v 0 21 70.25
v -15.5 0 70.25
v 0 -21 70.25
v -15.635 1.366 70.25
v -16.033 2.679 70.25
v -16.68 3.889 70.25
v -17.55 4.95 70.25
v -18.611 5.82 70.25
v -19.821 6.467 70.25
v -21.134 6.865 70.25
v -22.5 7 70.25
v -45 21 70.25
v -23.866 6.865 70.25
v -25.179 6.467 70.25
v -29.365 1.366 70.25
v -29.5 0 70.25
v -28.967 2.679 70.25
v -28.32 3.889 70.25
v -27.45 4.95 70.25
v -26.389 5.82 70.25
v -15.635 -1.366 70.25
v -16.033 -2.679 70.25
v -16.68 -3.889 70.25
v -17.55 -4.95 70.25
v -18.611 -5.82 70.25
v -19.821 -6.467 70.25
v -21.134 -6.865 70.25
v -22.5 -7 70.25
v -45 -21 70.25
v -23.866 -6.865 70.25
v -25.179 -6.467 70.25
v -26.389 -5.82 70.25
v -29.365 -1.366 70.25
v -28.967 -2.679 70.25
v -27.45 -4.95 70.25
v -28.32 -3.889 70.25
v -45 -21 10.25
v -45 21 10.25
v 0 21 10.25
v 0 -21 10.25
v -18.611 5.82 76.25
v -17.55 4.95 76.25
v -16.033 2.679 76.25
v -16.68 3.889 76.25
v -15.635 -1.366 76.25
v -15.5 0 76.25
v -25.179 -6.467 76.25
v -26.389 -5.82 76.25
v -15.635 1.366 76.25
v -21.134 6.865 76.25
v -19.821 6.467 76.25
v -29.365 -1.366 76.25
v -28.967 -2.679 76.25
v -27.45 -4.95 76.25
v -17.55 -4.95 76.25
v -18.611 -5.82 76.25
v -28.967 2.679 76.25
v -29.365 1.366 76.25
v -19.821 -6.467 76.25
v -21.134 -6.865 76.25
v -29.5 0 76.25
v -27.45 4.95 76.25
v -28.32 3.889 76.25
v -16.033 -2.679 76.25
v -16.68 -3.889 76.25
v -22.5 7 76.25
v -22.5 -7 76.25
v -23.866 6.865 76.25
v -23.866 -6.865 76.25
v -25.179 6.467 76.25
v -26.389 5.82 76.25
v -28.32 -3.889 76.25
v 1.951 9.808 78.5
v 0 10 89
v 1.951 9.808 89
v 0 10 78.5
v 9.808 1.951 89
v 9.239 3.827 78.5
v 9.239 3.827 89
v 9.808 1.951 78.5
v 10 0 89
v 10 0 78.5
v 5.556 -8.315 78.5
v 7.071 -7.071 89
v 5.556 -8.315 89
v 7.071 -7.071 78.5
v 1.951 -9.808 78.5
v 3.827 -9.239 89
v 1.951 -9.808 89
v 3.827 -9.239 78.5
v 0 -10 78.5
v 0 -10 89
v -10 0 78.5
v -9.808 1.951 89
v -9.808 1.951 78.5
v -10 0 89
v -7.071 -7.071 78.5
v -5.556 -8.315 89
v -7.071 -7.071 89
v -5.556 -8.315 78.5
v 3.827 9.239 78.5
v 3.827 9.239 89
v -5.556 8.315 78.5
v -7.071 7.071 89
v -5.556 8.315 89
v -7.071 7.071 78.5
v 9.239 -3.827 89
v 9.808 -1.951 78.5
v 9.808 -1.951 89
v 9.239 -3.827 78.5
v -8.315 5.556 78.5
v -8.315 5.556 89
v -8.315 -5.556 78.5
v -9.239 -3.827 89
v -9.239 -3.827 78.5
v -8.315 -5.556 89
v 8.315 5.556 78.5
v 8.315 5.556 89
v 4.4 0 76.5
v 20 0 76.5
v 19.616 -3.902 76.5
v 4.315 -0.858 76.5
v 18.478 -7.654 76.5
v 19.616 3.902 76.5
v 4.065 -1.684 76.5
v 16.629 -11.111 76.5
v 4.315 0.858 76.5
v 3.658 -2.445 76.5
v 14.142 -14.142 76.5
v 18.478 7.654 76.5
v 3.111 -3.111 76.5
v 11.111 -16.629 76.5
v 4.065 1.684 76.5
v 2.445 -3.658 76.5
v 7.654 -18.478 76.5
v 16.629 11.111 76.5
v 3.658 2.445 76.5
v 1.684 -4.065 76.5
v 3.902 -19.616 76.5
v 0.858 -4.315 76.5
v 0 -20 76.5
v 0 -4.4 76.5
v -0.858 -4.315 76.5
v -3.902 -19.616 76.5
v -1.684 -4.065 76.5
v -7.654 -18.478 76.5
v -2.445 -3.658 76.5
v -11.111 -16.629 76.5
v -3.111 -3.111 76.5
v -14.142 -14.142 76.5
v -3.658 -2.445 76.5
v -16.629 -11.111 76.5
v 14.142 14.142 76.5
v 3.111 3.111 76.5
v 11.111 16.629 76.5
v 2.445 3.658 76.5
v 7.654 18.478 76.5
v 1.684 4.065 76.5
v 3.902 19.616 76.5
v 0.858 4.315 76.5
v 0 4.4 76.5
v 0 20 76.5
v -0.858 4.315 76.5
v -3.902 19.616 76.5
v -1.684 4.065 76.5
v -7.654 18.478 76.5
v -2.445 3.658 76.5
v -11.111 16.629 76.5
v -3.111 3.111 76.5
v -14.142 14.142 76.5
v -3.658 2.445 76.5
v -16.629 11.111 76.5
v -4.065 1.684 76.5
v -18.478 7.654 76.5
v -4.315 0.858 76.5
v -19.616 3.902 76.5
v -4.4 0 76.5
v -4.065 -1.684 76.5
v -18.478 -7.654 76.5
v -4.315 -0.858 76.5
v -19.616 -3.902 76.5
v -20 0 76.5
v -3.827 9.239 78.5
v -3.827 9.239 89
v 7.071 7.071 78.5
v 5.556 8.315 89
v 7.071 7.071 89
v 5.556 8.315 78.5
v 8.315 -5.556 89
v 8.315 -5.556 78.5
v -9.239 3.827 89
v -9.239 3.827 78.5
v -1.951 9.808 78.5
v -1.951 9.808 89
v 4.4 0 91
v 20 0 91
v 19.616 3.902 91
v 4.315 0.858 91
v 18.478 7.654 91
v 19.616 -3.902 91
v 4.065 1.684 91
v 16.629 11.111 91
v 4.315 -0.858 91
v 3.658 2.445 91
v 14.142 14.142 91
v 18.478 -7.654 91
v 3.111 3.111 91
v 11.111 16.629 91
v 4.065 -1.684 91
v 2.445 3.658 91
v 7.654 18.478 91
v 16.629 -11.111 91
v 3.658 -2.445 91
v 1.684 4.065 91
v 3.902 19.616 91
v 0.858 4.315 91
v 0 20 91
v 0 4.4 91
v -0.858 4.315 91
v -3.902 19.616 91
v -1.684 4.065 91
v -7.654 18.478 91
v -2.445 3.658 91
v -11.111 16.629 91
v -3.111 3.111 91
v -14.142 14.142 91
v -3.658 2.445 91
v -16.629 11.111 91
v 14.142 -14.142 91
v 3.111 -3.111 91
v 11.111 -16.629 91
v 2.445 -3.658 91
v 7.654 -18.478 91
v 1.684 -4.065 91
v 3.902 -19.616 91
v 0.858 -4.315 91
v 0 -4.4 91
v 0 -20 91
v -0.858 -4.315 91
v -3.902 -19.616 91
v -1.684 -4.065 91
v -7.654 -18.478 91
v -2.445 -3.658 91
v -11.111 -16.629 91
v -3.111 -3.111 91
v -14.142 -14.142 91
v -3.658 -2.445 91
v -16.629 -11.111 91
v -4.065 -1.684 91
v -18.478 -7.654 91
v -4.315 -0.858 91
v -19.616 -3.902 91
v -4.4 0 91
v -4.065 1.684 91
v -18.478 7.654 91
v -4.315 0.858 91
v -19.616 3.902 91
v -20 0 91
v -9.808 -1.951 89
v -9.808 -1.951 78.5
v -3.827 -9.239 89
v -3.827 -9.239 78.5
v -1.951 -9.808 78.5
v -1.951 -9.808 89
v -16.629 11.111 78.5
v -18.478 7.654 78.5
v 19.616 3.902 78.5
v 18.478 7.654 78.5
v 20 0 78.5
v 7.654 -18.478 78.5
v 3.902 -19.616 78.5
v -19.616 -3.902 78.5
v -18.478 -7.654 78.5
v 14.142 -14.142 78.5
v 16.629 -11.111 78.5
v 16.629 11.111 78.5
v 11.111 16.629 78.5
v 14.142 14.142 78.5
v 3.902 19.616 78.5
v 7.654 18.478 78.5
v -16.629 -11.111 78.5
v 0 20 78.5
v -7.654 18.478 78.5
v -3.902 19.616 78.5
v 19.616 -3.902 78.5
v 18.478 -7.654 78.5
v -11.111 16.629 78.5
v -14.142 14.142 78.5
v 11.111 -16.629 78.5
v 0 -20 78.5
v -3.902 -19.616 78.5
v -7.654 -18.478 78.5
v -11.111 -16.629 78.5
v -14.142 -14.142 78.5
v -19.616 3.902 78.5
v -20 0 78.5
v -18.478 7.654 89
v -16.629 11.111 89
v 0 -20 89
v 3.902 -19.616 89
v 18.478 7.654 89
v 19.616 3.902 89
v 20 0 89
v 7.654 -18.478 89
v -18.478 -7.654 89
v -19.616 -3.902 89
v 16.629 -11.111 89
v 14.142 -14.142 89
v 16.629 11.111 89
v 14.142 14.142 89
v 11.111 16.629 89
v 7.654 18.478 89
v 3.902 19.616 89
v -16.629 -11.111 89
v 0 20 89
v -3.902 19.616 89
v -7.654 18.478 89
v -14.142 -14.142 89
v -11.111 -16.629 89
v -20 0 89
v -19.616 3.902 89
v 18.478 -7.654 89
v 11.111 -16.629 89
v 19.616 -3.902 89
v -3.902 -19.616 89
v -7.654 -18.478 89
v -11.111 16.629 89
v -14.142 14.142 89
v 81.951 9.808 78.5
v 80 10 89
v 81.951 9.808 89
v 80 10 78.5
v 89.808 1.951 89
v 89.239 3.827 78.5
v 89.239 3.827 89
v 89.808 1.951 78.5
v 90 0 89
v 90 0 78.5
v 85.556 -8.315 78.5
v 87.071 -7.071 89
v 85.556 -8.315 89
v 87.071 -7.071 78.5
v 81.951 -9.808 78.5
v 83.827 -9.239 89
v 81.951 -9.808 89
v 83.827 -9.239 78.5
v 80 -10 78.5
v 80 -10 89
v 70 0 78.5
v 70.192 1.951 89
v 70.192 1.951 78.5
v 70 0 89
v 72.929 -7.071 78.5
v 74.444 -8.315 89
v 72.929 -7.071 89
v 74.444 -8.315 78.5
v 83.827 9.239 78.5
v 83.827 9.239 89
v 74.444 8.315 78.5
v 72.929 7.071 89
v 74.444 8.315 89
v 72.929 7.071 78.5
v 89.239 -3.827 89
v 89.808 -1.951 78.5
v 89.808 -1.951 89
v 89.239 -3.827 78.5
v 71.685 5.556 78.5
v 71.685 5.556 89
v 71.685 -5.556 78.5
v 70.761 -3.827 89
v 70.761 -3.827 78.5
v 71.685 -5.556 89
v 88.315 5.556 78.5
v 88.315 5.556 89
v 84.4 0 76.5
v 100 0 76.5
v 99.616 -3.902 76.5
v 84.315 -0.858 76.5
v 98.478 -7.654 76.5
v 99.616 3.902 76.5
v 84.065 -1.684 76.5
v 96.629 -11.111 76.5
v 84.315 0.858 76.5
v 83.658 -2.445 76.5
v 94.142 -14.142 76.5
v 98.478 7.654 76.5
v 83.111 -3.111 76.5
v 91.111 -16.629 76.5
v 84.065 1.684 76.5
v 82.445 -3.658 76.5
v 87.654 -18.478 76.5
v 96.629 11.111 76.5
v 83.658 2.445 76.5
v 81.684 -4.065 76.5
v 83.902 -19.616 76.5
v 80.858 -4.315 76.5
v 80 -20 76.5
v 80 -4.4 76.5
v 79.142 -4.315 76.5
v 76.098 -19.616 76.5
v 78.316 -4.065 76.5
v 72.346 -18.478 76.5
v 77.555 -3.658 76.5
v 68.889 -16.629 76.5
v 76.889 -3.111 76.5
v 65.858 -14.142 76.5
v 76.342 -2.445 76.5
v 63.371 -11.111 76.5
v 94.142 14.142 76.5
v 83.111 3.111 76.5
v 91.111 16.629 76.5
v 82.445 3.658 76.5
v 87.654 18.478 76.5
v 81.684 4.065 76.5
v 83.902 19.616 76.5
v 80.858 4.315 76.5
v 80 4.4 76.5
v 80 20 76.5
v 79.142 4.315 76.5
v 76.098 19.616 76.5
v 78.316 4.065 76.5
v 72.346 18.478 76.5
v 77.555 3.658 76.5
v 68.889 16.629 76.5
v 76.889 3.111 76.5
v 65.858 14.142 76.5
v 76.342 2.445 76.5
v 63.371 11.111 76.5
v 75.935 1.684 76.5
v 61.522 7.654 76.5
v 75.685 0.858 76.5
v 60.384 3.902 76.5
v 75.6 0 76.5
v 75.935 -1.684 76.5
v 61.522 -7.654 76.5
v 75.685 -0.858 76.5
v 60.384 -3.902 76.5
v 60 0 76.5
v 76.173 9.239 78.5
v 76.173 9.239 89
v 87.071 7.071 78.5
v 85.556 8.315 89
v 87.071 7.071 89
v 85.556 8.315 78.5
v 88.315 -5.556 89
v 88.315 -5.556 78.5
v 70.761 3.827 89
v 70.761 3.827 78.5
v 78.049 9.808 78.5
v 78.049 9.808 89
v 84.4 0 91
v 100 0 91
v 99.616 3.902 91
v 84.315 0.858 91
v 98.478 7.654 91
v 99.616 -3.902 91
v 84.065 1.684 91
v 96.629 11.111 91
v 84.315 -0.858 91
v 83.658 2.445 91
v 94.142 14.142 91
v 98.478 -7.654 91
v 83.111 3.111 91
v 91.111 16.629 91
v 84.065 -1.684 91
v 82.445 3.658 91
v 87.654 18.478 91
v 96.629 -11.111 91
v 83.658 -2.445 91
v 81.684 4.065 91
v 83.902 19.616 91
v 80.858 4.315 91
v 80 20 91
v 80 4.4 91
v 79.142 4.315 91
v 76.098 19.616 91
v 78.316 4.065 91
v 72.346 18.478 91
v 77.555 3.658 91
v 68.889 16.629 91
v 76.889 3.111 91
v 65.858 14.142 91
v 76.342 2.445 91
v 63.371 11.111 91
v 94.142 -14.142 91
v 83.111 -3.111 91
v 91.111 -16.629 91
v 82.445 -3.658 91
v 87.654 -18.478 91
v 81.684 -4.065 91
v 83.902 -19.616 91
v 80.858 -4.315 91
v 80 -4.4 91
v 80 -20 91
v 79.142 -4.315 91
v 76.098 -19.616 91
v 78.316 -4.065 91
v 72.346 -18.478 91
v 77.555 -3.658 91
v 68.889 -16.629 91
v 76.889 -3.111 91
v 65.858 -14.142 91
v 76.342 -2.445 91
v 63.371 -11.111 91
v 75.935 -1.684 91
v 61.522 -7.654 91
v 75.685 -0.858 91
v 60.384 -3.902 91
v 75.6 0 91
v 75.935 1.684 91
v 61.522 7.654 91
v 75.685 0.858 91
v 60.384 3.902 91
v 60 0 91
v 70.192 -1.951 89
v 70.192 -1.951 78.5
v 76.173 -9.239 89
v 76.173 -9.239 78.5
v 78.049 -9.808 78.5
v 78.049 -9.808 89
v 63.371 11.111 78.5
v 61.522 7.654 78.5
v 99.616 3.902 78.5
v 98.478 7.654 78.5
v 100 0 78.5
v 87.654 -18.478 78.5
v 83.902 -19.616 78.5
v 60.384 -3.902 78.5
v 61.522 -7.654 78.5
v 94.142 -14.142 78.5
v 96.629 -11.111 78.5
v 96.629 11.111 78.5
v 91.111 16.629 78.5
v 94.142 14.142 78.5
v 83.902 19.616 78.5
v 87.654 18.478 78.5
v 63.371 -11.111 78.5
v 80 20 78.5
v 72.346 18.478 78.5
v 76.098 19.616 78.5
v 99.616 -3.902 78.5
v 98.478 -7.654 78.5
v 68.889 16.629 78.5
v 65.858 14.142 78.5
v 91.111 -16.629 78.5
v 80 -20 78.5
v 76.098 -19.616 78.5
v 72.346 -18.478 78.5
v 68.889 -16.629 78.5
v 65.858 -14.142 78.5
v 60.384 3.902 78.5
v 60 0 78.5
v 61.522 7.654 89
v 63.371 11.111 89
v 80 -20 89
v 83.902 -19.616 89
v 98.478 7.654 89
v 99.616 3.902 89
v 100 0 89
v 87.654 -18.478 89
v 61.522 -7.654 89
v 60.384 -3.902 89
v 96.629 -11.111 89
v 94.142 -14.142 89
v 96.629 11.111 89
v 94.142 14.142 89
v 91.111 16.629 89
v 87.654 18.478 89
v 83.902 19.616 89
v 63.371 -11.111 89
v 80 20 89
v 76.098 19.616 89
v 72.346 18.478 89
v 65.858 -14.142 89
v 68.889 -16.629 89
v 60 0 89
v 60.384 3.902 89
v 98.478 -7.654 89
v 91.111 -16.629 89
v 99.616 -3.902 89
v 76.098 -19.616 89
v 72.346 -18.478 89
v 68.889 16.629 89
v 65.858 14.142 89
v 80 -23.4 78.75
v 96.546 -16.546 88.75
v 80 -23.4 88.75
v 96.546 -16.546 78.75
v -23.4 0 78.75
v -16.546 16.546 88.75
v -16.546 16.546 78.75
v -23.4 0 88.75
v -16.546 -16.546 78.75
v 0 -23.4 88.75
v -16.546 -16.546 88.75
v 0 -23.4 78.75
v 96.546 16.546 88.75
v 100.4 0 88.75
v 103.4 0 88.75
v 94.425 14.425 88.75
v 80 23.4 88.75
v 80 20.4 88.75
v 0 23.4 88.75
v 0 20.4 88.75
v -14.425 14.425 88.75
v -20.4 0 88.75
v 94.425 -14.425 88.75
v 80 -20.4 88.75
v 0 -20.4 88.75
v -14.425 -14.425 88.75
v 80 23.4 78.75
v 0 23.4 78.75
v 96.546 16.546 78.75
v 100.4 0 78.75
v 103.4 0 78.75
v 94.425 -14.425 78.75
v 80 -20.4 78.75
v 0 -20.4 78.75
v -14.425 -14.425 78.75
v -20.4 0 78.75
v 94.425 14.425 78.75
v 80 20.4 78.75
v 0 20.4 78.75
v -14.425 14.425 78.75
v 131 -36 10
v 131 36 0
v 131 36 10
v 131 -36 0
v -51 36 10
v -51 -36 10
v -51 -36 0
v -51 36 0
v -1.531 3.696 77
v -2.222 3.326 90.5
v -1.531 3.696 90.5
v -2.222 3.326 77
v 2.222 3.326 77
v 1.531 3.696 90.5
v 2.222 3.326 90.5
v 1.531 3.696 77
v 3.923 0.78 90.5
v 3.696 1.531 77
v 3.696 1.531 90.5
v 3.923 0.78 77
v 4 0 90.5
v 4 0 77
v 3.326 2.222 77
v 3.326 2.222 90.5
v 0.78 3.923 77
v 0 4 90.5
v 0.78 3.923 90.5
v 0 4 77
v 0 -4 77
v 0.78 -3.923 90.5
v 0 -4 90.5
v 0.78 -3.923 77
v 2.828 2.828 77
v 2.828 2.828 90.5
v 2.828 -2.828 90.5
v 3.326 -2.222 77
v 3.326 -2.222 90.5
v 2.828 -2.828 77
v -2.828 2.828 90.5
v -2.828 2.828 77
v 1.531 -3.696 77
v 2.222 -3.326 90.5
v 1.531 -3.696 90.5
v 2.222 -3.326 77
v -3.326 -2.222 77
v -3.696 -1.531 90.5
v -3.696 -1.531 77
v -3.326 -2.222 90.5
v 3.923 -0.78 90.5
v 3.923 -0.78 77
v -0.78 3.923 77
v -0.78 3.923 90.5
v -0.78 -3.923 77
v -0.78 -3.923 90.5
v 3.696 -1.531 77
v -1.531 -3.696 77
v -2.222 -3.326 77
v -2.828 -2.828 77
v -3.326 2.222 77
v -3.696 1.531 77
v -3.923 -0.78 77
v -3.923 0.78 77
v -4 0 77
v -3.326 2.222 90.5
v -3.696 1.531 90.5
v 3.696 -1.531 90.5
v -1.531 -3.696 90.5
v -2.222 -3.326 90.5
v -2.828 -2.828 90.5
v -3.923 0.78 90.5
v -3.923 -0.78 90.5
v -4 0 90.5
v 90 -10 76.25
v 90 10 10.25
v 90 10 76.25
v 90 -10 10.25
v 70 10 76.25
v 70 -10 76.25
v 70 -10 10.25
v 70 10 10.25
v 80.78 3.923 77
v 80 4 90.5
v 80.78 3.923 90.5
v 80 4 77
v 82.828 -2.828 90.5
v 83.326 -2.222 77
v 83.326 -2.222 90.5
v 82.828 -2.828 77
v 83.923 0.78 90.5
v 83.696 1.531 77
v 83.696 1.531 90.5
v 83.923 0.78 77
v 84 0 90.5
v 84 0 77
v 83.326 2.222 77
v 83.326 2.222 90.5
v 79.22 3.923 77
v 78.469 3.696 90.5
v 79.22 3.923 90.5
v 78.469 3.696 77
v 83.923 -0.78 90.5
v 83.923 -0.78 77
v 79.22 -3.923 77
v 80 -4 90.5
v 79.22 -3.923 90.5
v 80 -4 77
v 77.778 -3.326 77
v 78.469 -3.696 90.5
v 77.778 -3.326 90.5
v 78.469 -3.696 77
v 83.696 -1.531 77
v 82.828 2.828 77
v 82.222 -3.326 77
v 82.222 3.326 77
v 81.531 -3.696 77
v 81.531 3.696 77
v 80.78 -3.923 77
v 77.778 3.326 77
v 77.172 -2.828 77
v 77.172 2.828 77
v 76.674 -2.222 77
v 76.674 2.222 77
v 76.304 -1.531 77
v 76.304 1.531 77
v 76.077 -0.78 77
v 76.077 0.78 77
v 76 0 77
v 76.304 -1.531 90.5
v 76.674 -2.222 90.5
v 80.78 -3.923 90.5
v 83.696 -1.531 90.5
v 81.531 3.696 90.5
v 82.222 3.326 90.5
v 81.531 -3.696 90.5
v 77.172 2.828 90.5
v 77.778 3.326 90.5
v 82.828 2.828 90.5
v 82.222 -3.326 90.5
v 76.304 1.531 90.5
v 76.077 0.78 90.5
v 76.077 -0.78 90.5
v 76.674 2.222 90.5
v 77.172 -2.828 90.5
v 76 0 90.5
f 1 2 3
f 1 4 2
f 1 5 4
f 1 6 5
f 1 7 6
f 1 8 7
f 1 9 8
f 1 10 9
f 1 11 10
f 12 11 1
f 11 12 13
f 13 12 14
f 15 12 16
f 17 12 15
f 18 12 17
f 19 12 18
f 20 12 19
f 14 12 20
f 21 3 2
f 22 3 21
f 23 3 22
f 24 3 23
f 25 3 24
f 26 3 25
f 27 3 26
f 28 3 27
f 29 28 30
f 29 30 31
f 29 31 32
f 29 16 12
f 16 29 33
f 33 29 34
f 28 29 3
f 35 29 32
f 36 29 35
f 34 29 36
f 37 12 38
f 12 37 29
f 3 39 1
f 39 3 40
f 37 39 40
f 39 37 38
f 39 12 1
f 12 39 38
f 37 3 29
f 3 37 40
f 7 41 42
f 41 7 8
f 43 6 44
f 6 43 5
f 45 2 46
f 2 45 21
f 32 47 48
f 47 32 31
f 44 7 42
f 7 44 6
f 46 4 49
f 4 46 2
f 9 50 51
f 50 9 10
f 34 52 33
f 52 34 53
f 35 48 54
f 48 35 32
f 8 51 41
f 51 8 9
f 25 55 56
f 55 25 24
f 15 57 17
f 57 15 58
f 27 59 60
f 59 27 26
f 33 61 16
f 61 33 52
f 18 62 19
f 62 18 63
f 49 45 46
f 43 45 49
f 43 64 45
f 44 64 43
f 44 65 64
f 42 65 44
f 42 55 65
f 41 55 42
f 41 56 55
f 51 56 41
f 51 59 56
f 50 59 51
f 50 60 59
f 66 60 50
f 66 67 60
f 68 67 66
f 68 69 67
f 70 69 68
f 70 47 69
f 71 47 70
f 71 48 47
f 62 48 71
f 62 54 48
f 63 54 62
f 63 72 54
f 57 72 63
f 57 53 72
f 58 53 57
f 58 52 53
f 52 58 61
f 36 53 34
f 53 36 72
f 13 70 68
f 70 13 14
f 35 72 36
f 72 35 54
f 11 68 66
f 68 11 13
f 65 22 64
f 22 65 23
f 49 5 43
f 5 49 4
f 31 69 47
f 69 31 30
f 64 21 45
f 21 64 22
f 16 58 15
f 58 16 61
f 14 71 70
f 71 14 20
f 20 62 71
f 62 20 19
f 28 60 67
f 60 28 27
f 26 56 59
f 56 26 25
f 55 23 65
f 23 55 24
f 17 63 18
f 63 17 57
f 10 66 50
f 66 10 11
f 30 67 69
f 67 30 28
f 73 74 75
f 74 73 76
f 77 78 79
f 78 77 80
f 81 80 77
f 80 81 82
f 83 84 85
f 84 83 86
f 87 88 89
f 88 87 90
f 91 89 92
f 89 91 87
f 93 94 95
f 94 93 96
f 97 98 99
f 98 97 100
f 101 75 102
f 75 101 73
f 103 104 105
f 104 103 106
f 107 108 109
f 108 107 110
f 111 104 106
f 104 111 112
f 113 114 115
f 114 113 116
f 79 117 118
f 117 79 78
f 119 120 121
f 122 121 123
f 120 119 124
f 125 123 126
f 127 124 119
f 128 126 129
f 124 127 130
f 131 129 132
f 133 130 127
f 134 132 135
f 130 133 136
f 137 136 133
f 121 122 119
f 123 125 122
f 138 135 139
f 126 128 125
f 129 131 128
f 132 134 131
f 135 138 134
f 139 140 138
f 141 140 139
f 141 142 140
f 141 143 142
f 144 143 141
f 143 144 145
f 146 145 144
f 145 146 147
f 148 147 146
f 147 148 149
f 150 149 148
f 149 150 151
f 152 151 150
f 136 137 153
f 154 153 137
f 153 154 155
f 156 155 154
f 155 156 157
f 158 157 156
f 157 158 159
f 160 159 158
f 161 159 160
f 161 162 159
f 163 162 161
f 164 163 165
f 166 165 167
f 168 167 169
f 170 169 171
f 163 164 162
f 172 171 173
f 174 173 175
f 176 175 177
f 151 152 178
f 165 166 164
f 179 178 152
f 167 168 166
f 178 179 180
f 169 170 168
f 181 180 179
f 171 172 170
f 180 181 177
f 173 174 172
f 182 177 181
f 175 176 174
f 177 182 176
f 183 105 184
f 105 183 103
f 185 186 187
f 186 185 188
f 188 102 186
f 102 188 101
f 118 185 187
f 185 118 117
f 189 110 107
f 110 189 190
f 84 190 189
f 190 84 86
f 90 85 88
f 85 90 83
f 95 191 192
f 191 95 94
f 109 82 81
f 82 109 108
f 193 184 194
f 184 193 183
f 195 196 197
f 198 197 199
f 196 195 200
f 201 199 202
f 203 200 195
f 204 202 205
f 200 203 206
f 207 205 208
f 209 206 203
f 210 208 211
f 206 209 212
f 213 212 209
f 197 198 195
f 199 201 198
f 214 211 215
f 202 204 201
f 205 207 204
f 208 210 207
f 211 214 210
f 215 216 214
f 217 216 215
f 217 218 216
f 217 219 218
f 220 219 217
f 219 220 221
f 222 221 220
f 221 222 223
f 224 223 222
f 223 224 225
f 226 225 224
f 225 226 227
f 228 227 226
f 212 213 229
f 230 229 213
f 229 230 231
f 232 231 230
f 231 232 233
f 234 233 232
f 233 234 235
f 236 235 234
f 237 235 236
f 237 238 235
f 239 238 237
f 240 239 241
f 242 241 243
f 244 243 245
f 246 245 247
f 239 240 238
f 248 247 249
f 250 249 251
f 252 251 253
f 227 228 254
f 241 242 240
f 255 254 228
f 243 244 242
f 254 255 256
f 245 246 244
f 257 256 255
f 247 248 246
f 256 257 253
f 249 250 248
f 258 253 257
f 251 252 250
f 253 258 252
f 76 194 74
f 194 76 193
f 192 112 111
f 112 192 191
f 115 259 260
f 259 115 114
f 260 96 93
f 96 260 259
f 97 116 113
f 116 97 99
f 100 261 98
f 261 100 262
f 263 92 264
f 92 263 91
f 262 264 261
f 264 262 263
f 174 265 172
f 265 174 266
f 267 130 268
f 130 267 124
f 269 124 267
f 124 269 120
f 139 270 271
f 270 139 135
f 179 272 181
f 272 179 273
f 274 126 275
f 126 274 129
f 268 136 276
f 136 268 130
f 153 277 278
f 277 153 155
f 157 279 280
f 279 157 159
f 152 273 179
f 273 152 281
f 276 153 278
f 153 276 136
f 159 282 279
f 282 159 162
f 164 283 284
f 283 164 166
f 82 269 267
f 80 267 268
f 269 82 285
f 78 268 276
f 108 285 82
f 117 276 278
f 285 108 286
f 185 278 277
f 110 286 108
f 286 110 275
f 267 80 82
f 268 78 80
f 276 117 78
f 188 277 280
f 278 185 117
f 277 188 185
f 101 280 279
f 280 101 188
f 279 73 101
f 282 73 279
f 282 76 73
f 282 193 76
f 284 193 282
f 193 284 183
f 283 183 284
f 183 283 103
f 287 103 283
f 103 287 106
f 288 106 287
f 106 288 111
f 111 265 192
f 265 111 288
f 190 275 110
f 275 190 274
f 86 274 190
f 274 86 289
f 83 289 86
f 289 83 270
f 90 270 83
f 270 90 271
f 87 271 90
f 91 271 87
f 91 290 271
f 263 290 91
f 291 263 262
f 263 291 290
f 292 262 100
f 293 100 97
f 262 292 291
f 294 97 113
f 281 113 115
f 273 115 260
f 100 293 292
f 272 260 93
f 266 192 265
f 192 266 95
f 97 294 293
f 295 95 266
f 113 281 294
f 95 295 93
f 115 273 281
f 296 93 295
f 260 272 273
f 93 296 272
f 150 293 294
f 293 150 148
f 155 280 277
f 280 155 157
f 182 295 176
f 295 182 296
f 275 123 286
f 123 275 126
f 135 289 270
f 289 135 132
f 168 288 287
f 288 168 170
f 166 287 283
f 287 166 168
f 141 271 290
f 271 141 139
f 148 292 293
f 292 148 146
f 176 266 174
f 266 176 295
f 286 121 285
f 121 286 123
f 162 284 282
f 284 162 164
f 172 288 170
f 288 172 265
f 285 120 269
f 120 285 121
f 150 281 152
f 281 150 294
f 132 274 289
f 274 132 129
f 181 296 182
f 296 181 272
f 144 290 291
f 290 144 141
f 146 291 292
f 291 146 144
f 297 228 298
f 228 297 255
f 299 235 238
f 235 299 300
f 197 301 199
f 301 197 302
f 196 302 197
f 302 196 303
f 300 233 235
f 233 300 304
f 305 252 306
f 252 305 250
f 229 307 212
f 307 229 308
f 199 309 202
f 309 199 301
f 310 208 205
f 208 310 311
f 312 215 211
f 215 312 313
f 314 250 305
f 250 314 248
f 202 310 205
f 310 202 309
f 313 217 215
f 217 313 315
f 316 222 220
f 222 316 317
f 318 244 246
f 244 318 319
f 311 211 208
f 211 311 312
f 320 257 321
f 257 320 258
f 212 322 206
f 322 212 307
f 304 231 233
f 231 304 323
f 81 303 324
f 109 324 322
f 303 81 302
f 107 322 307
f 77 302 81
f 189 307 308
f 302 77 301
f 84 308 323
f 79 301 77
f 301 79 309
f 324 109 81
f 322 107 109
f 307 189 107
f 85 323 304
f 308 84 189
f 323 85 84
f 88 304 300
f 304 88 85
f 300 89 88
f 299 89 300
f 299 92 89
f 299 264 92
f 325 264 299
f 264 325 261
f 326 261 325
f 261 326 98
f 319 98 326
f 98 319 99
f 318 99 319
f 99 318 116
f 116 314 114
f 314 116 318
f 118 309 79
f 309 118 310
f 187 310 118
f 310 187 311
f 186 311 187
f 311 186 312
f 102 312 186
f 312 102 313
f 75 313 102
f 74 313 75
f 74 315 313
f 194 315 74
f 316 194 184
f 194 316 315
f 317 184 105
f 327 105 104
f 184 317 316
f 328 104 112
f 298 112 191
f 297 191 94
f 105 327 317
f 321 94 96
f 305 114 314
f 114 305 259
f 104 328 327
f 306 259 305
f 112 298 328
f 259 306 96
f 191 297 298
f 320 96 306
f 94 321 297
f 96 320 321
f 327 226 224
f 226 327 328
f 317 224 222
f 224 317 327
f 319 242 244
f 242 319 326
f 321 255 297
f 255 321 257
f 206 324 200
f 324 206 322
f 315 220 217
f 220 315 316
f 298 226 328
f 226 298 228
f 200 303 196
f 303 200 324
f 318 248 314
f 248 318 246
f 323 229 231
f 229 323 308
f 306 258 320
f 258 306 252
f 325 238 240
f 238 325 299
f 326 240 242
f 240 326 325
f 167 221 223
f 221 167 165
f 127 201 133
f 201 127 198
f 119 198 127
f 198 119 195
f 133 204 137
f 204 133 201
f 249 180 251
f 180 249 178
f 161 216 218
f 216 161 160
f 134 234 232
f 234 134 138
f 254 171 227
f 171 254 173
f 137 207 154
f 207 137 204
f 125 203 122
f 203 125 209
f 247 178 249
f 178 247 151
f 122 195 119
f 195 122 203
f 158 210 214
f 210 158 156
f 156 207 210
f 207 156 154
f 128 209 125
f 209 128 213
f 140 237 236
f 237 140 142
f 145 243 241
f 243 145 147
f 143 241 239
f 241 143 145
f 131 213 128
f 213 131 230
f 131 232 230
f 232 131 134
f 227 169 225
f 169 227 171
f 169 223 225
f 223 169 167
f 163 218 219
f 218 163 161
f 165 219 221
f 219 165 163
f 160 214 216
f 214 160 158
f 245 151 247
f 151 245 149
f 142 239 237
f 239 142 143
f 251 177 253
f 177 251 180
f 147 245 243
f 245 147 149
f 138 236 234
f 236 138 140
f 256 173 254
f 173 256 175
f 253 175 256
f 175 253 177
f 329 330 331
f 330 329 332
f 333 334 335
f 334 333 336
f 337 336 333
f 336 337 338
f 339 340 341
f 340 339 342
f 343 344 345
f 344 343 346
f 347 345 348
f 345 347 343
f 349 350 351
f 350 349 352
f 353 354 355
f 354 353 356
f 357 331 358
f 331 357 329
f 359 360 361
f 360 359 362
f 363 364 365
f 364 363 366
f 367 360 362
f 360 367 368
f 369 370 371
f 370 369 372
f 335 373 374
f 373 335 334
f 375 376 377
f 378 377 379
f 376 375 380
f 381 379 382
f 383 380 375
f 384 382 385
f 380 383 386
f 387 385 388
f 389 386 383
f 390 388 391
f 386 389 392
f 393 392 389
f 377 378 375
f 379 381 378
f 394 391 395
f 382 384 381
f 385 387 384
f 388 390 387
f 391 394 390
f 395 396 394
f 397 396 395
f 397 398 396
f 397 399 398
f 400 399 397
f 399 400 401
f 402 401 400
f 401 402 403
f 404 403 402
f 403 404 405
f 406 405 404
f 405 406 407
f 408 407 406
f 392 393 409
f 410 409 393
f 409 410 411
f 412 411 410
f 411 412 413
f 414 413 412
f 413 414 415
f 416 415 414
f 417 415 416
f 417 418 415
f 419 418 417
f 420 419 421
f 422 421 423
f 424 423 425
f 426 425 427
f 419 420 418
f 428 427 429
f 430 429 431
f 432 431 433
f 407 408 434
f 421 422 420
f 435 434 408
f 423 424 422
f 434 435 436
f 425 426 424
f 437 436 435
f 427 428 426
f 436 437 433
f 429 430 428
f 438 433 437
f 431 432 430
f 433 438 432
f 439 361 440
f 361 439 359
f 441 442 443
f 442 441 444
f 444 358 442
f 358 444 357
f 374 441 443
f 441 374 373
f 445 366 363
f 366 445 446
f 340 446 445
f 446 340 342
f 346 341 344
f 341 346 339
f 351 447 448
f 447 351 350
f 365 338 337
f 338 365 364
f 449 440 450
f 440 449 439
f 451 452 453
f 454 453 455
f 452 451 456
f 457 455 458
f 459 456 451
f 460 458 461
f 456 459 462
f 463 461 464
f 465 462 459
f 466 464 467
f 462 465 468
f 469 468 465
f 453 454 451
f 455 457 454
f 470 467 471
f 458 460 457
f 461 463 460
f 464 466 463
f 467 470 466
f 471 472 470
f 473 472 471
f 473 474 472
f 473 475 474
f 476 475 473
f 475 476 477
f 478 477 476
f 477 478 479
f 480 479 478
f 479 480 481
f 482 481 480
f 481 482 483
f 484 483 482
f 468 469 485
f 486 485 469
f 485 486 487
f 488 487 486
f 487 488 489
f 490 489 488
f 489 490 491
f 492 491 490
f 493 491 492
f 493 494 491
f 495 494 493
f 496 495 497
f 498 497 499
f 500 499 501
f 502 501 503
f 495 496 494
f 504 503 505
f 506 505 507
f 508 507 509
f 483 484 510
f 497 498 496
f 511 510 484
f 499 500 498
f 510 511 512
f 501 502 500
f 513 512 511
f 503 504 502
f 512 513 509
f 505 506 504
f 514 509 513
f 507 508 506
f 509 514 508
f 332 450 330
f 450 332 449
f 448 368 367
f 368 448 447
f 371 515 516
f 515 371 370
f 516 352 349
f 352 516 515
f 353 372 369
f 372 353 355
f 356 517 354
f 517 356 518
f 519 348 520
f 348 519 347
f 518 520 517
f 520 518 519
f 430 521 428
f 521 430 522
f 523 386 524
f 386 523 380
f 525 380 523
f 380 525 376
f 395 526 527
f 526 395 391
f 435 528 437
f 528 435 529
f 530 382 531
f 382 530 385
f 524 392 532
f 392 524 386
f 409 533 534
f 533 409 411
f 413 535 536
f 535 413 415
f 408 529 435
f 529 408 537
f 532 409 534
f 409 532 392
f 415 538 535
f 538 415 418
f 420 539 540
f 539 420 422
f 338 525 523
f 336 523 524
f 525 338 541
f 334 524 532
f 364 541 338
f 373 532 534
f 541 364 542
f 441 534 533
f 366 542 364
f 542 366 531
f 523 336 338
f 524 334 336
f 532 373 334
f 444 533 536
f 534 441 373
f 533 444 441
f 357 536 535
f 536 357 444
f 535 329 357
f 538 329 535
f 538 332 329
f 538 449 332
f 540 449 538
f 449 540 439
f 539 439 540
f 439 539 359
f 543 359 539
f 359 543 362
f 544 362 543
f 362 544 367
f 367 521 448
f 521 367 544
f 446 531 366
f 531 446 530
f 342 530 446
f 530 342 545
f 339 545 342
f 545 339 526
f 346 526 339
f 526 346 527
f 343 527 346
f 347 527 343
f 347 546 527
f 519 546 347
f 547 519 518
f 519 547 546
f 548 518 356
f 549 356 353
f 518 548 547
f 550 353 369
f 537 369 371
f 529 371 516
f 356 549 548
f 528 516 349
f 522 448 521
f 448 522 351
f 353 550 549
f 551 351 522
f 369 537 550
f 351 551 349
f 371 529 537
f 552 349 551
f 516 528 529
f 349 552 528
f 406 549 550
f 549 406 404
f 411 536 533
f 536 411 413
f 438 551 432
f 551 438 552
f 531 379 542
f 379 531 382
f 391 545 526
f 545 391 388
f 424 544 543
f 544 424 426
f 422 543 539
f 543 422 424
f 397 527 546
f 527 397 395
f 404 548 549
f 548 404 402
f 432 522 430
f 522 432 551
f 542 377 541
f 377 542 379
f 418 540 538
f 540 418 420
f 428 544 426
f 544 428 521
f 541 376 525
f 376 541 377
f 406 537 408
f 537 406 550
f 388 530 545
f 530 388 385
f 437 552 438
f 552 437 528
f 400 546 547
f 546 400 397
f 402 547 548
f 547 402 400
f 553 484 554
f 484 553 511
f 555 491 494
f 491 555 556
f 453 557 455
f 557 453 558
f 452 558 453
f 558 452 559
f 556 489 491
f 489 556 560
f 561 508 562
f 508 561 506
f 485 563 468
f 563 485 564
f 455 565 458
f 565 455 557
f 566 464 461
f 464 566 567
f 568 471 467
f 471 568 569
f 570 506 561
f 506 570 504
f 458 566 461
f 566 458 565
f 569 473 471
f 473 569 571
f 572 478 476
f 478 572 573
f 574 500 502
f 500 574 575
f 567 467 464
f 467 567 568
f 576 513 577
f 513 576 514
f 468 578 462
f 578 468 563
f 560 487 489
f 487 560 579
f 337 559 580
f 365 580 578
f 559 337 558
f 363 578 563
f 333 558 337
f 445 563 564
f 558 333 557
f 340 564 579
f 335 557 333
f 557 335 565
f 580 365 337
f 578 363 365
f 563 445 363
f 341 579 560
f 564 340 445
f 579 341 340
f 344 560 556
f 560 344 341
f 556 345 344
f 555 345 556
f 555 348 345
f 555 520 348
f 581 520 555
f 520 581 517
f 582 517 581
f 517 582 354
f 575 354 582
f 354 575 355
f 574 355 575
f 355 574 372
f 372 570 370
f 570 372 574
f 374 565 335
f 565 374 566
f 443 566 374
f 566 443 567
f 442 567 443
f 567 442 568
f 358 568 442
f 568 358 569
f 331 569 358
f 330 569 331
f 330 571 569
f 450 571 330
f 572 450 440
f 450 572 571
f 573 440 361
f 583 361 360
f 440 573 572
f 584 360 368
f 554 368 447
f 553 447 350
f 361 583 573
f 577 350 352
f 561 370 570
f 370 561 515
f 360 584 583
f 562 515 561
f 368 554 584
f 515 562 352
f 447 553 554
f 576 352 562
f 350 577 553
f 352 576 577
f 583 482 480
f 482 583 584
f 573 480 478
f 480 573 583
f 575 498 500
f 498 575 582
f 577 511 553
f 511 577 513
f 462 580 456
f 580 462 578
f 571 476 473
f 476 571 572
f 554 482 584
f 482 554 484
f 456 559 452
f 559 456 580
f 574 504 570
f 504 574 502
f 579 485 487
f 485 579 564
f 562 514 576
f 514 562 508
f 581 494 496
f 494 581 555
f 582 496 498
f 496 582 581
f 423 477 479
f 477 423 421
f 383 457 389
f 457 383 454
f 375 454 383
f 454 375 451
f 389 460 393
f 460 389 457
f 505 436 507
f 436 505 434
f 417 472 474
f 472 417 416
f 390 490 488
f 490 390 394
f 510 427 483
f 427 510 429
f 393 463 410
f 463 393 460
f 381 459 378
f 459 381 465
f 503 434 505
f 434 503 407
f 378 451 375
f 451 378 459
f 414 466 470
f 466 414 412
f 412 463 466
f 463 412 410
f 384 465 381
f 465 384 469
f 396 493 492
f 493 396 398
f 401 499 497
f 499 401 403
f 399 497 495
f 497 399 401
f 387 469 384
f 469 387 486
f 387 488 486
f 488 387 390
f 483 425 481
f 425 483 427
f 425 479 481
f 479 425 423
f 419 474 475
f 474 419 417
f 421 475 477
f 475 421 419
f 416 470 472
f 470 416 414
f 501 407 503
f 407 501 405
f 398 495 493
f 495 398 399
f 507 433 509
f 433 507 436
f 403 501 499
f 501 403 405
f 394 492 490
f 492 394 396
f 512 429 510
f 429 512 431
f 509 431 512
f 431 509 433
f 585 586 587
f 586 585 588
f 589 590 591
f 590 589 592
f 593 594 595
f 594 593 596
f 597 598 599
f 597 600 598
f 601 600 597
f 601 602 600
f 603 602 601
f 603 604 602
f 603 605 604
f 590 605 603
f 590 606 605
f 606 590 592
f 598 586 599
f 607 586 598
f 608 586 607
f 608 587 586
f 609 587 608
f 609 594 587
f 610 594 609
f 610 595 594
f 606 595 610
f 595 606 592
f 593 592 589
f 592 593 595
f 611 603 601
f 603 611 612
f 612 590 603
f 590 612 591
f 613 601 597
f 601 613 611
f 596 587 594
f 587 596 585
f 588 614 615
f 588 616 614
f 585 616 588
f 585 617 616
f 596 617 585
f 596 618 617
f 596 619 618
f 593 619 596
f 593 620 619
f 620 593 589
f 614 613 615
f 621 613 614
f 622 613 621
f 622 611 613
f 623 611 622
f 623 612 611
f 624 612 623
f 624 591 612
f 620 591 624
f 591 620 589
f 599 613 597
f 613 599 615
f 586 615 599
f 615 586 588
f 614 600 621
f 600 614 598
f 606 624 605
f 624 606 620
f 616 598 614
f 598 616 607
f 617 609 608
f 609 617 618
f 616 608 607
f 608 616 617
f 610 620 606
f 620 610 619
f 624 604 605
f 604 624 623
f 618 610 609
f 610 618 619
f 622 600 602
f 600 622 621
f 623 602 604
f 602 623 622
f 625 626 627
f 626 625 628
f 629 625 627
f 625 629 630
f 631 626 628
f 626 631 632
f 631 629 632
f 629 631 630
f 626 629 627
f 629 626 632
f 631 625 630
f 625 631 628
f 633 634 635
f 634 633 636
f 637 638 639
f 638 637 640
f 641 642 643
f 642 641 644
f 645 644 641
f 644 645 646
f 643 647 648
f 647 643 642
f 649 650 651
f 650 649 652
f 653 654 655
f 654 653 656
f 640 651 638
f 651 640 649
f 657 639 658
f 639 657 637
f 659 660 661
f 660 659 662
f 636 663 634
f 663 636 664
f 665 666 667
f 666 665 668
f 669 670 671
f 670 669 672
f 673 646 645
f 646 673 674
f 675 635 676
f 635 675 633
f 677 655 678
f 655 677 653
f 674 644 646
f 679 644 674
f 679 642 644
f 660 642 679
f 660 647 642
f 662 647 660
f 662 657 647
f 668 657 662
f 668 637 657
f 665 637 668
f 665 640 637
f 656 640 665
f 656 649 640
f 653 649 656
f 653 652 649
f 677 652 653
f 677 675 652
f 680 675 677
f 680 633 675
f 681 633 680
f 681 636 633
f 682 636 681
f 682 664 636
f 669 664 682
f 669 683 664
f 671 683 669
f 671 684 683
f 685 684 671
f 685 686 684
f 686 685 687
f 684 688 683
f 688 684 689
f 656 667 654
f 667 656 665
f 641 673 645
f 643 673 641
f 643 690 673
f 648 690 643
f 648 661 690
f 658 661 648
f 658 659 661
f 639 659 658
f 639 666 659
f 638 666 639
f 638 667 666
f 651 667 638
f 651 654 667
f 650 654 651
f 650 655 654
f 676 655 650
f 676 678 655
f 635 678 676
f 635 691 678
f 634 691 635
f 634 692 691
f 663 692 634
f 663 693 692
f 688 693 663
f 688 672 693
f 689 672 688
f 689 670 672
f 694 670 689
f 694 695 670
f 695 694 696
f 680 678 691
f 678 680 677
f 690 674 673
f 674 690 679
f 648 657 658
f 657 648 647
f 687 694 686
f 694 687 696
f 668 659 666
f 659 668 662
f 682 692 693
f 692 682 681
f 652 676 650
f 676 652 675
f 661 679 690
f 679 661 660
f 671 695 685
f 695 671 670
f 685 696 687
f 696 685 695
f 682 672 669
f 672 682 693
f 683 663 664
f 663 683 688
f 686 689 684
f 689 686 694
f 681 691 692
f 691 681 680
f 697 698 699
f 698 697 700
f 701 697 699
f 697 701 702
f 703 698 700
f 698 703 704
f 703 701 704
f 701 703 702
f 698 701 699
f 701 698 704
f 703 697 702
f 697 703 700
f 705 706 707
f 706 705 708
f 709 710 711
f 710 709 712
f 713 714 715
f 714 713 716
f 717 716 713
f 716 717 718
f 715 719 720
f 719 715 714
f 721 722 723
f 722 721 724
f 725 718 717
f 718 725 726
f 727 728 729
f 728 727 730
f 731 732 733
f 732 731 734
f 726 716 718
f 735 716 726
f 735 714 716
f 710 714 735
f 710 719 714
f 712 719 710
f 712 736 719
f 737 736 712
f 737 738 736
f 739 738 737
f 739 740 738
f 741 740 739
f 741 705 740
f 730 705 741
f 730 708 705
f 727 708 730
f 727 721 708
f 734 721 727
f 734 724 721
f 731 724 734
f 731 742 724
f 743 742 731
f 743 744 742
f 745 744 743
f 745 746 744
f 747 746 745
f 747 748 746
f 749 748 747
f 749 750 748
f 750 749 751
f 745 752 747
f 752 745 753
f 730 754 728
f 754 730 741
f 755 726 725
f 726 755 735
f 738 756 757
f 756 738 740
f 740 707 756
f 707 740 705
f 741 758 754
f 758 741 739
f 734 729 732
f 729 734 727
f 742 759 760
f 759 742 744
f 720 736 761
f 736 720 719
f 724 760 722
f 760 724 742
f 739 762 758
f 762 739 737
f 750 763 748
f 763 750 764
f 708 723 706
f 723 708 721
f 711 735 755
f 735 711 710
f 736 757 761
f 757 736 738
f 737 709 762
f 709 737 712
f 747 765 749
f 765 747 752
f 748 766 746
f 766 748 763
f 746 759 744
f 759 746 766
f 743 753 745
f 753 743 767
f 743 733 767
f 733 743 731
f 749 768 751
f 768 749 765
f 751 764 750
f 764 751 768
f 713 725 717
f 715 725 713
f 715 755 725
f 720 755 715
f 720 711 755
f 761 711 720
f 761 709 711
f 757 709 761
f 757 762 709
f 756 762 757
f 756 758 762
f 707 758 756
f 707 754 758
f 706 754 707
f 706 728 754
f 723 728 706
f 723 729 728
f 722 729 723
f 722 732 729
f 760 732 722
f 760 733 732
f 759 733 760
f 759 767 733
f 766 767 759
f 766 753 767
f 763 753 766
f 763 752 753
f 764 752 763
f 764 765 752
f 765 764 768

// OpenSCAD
$fn = 32;

// ------------------------------------------------------------------------
// Motor belt drive: span 80 mm, pulleys d40, belt 10 mm wide
// Every part is its own module, assembly() places every instance.
// ------------------------------------------------------------------------

// --- part 1 ---
module base_plate() {
  difference() {
    translate([-91, -36, 0]) cube([182, 72, 10]);
  }
}

// --- part 2 ---
module motor() {
  union() {
    translate([-30, -21, 0]) cube([60, 42, 45]);
    translate([33, 0, 22.5]) rotate([0, 90, 0]) cylinder(h = 6, d = 14, center = true);
  }
}

// --- part 3 ---
module drive_shaft() {
  translate([0, 0, -6.75]) cylinder(h = 13.5, d = 8);
}

// --- part 4 ---
module pulley_drive() {
  difference() {
    union() {
      cylinder(h = 14.5, d = 20);
      cylinder(h = 2, d = 40);
      translate([0, 0, 12.5]) cylinder(h = 2, d = 40);
    }
    translate([0, 0, -1]) cylinder(h = 16.5, d = 8.8);
  }
}

// --- part 5 ---
module idler_post() {
  translate([-10, -10, 0]) cube([20, 20, 66]);
}

// --- part 6 ---
module driven_shaft() {
  translate([0, 0, -6.75]) cylinder(h = 13.5, d = 8);
}

// --- part 7 ---
module pulley_driven() {
  difference() {
    union() {
      cylinder(h = 14.5, d = 20);
      cylinder(h = 2, d = 40);
      translate([0, 0, 12.5]) cylinder(h = 2, d = 40);
    }
    translate([0, 0, -1]) cylinder(h = 16.5, d = 8.8);
  }
}

// --- part 8 ---
module drive_belt() {
  difference() {
    linear_extrude(height = 10) polygon(points = concat([for (a = [90 : 45 : 270]) [23.4 * cos(a), 23.4 * sin(a)]], [for (a = [270 : 45 : 450]) [80 + 23.4 * cos(a), 23.4 * sin(a)]]));
    translate([0, 0, -1]) linear_extrude(height = 12) polygon(points = concat([for (a = [90 : 45 : 270]) [20.4 * cos(a), 20.4 * sin(a)]], [for (a = [270 : 45 : 450]) [80 + 20.4 * cos(a), 20.4 * sin(a)]]));
  }
}

// --- assembly ---
module assembly() {
  color([0.80, 0.24, 0.20]) translate([40, 0, 0]) rotate([0, 0, 0]) base_plate();
  color([0.20, 0.45, 0.75]) translate([0, 0, 40.25]) rotate([0, 270, 0]) motor();
  color([0.25, 0.62, 0.32]) translate([0, 0, 83.75]) rotate([0, 0, 0]) drive_shaft();
  color([0.92, 0.70, 0.18]) translate([0, 0, 76.5]) rotate([0, 0, 0]) pulley_drive();
  color([0.58, 0.35, 0.70]) translate([80, 0, 10.25]) rotate([0, 0, 0]) idler_post();
  color([0.16, 0.66, 0.66]) translate([80, 0, 83.75]) rotate([0, 0, 0]) driven_shaft();
  color([0.85, 0.48, 0.18]) translate([80, 0, 76.5]) rotate([0, 0, 0]) pulley_driven();
  color([0.55, 0.60, 0.65]) translate([0, 0, 78.75]) rotate([0, 0, 0]) drive_belt();
}

assembly();
